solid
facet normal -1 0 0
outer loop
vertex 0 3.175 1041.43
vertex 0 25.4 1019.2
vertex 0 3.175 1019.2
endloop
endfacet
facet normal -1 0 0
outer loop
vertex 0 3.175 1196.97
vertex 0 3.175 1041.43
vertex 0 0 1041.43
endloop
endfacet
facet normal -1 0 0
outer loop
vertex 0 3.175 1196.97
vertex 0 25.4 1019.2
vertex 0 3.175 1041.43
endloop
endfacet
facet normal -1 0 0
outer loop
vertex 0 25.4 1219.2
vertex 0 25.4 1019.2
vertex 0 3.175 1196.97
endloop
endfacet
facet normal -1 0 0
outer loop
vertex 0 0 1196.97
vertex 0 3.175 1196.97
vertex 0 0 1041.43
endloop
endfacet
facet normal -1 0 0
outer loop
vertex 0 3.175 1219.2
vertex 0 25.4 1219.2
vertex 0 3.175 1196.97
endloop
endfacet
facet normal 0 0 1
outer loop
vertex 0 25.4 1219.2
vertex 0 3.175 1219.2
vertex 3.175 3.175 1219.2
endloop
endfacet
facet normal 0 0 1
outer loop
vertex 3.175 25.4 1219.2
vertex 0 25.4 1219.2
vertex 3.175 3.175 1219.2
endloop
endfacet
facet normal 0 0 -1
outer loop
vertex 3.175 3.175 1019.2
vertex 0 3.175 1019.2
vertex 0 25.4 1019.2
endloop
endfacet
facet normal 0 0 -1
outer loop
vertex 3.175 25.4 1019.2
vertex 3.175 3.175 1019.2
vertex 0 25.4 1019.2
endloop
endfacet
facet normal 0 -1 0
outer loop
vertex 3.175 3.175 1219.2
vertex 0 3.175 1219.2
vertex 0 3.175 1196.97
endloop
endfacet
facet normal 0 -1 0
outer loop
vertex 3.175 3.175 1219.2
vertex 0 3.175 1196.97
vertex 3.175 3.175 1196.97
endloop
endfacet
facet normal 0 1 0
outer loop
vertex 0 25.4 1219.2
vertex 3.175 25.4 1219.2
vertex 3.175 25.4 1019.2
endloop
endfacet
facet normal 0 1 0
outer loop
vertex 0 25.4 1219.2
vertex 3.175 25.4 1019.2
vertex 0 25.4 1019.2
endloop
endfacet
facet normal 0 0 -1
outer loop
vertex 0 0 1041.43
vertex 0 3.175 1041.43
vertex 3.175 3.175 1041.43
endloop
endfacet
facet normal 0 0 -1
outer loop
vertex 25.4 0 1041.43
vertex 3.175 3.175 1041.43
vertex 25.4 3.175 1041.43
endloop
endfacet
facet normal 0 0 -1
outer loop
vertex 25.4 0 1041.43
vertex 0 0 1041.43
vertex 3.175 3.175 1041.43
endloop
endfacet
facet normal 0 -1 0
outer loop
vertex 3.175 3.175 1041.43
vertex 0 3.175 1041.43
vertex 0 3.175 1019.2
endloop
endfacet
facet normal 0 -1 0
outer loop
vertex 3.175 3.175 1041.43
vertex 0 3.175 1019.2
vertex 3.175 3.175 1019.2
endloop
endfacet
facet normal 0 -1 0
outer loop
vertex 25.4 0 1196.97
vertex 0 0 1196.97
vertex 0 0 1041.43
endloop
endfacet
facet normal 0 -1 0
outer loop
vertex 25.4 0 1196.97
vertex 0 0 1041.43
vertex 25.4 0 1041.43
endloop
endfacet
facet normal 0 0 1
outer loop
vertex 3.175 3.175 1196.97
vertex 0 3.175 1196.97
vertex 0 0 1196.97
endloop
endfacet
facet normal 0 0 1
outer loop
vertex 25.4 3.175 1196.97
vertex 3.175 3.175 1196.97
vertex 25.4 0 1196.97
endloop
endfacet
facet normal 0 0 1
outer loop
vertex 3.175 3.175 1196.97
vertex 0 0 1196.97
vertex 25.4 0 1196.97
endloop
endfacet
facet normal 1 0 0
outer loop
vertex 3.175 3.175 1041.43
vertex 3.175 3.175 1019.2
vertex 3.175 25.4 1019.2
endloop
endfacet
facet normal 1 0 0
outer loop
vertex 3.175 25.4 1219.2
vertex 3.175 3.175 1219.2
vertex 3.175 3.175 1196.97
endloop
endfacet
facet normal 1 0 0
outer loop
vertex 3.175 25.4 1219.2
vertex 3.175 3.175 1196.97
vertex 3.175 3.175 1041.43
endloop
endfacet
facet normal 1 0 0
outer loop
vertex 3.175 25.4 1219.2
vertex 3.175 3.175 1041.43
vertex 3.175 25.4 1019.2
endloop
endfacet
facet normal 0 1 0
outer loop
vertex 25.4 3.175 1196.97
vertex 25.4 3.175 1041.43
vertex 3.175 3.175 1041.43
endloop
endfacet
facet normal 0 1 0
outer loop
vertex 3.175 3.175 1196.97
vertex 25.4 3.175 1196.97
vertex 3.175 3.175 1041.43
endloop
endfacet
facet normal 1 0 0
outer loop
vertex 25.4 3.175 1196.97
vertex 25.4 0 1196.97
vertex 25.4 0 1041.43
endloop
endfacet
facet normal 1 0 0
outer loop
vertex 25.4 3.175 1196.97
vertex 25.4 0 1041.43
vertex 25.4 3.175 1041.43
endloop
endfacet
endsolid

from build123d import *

# Parameters (mm, degrees)
BOSS_EXTRUDE1_DEPTH = 1219.2
FILLET1_R           = 0.4064
SKETCH4_W           = 2238.4
SKETCH4_H           = 103.278519729
CUT_EXTRUDE1_DEPTH  = 60
SKETCH5_W           = 25.4
SKETCH5_H           = 22.23
CUT_EXTRUDE2_DEPTH  = 3.175
SKETCH6_W           = 25.4
SKETCH6_H           = 22.23
CUT_EXTRUDE3_DEPTH  = 3.175
SKETCH7_W           = 1.26890891
SKETCH7_H           = 1.024965533
CUT_EXTRUDE4_DEPTH  = 220


with BuildPart() as part:
    # Sketch3 → Boss-Extrude1 (new, symmetric)
    with BuildSketch(Plane.XY):
        Polygon((3.175, 25.4), (0, 25.4), (0, 0), (25.4, 0), (25.4, 3.175), (3.175, 3.175), align=None)
    extrude(amount=BOSS_EXTRUDE1_DEPTH, both=True)

    # Fillet1
    fillet1_edges = [part.edges().sort_by_distance(p)[0] for p in [
        (3.175, 3.175, 0),
    ]]
    fillet(fillet1_edges, radius=FILLET1_R)

    # Sketch4 → Cut-Extrude1 (cut)
    with BuildSketch(Plane.ZY):
        with Locations((-100, -26.239259864)):
            Rectangle(SKETCH4_W, SKETCH4_H)
    extrude(amount=-CUT_EXTRUDE1_DEPTH, mode=Mode.SUBTRACT)

    # Sketch5 → Cut-Extrude2 (cut)
    with BuildSketch(Plane.XZ):
        with Locations((12.7, 1030.315)):
            Rectangle(SKETCH5_W, SKETCH5_H)
    extrude(amount=-CUT_EXTRUDE2_DEPTH, mode=Mode.SUBTRACT)

    # Sketch6 → Cut-Extrude3 (cut)
    with BuildSketch(Plane.XZ):
        with Locations((12.7, 1208.085)):
            Rectangle(SKETCH6_W, SKETCH6_H)
    extrude(amount=-CUT_EXTRUDE3_DEPTH, mode=Mode.SUBTRACT)

    # Sketch7 → Cut-Extrude4 (cut)
    with BuildSketch(Plane(origin=(0, 0, 1019.2), x_dir=(-1, 0, 0), z_dir=(0, 0, -1))):
        with Locations((-3.809454455, 3.687482767)):
            Rectangle(SKETCH7_W, SKETCH7_H)
    extrude(amount=-CUT_EXTRUDE4_DEPTH, mode=Mode.SUBTRACT)


solid = part.part
